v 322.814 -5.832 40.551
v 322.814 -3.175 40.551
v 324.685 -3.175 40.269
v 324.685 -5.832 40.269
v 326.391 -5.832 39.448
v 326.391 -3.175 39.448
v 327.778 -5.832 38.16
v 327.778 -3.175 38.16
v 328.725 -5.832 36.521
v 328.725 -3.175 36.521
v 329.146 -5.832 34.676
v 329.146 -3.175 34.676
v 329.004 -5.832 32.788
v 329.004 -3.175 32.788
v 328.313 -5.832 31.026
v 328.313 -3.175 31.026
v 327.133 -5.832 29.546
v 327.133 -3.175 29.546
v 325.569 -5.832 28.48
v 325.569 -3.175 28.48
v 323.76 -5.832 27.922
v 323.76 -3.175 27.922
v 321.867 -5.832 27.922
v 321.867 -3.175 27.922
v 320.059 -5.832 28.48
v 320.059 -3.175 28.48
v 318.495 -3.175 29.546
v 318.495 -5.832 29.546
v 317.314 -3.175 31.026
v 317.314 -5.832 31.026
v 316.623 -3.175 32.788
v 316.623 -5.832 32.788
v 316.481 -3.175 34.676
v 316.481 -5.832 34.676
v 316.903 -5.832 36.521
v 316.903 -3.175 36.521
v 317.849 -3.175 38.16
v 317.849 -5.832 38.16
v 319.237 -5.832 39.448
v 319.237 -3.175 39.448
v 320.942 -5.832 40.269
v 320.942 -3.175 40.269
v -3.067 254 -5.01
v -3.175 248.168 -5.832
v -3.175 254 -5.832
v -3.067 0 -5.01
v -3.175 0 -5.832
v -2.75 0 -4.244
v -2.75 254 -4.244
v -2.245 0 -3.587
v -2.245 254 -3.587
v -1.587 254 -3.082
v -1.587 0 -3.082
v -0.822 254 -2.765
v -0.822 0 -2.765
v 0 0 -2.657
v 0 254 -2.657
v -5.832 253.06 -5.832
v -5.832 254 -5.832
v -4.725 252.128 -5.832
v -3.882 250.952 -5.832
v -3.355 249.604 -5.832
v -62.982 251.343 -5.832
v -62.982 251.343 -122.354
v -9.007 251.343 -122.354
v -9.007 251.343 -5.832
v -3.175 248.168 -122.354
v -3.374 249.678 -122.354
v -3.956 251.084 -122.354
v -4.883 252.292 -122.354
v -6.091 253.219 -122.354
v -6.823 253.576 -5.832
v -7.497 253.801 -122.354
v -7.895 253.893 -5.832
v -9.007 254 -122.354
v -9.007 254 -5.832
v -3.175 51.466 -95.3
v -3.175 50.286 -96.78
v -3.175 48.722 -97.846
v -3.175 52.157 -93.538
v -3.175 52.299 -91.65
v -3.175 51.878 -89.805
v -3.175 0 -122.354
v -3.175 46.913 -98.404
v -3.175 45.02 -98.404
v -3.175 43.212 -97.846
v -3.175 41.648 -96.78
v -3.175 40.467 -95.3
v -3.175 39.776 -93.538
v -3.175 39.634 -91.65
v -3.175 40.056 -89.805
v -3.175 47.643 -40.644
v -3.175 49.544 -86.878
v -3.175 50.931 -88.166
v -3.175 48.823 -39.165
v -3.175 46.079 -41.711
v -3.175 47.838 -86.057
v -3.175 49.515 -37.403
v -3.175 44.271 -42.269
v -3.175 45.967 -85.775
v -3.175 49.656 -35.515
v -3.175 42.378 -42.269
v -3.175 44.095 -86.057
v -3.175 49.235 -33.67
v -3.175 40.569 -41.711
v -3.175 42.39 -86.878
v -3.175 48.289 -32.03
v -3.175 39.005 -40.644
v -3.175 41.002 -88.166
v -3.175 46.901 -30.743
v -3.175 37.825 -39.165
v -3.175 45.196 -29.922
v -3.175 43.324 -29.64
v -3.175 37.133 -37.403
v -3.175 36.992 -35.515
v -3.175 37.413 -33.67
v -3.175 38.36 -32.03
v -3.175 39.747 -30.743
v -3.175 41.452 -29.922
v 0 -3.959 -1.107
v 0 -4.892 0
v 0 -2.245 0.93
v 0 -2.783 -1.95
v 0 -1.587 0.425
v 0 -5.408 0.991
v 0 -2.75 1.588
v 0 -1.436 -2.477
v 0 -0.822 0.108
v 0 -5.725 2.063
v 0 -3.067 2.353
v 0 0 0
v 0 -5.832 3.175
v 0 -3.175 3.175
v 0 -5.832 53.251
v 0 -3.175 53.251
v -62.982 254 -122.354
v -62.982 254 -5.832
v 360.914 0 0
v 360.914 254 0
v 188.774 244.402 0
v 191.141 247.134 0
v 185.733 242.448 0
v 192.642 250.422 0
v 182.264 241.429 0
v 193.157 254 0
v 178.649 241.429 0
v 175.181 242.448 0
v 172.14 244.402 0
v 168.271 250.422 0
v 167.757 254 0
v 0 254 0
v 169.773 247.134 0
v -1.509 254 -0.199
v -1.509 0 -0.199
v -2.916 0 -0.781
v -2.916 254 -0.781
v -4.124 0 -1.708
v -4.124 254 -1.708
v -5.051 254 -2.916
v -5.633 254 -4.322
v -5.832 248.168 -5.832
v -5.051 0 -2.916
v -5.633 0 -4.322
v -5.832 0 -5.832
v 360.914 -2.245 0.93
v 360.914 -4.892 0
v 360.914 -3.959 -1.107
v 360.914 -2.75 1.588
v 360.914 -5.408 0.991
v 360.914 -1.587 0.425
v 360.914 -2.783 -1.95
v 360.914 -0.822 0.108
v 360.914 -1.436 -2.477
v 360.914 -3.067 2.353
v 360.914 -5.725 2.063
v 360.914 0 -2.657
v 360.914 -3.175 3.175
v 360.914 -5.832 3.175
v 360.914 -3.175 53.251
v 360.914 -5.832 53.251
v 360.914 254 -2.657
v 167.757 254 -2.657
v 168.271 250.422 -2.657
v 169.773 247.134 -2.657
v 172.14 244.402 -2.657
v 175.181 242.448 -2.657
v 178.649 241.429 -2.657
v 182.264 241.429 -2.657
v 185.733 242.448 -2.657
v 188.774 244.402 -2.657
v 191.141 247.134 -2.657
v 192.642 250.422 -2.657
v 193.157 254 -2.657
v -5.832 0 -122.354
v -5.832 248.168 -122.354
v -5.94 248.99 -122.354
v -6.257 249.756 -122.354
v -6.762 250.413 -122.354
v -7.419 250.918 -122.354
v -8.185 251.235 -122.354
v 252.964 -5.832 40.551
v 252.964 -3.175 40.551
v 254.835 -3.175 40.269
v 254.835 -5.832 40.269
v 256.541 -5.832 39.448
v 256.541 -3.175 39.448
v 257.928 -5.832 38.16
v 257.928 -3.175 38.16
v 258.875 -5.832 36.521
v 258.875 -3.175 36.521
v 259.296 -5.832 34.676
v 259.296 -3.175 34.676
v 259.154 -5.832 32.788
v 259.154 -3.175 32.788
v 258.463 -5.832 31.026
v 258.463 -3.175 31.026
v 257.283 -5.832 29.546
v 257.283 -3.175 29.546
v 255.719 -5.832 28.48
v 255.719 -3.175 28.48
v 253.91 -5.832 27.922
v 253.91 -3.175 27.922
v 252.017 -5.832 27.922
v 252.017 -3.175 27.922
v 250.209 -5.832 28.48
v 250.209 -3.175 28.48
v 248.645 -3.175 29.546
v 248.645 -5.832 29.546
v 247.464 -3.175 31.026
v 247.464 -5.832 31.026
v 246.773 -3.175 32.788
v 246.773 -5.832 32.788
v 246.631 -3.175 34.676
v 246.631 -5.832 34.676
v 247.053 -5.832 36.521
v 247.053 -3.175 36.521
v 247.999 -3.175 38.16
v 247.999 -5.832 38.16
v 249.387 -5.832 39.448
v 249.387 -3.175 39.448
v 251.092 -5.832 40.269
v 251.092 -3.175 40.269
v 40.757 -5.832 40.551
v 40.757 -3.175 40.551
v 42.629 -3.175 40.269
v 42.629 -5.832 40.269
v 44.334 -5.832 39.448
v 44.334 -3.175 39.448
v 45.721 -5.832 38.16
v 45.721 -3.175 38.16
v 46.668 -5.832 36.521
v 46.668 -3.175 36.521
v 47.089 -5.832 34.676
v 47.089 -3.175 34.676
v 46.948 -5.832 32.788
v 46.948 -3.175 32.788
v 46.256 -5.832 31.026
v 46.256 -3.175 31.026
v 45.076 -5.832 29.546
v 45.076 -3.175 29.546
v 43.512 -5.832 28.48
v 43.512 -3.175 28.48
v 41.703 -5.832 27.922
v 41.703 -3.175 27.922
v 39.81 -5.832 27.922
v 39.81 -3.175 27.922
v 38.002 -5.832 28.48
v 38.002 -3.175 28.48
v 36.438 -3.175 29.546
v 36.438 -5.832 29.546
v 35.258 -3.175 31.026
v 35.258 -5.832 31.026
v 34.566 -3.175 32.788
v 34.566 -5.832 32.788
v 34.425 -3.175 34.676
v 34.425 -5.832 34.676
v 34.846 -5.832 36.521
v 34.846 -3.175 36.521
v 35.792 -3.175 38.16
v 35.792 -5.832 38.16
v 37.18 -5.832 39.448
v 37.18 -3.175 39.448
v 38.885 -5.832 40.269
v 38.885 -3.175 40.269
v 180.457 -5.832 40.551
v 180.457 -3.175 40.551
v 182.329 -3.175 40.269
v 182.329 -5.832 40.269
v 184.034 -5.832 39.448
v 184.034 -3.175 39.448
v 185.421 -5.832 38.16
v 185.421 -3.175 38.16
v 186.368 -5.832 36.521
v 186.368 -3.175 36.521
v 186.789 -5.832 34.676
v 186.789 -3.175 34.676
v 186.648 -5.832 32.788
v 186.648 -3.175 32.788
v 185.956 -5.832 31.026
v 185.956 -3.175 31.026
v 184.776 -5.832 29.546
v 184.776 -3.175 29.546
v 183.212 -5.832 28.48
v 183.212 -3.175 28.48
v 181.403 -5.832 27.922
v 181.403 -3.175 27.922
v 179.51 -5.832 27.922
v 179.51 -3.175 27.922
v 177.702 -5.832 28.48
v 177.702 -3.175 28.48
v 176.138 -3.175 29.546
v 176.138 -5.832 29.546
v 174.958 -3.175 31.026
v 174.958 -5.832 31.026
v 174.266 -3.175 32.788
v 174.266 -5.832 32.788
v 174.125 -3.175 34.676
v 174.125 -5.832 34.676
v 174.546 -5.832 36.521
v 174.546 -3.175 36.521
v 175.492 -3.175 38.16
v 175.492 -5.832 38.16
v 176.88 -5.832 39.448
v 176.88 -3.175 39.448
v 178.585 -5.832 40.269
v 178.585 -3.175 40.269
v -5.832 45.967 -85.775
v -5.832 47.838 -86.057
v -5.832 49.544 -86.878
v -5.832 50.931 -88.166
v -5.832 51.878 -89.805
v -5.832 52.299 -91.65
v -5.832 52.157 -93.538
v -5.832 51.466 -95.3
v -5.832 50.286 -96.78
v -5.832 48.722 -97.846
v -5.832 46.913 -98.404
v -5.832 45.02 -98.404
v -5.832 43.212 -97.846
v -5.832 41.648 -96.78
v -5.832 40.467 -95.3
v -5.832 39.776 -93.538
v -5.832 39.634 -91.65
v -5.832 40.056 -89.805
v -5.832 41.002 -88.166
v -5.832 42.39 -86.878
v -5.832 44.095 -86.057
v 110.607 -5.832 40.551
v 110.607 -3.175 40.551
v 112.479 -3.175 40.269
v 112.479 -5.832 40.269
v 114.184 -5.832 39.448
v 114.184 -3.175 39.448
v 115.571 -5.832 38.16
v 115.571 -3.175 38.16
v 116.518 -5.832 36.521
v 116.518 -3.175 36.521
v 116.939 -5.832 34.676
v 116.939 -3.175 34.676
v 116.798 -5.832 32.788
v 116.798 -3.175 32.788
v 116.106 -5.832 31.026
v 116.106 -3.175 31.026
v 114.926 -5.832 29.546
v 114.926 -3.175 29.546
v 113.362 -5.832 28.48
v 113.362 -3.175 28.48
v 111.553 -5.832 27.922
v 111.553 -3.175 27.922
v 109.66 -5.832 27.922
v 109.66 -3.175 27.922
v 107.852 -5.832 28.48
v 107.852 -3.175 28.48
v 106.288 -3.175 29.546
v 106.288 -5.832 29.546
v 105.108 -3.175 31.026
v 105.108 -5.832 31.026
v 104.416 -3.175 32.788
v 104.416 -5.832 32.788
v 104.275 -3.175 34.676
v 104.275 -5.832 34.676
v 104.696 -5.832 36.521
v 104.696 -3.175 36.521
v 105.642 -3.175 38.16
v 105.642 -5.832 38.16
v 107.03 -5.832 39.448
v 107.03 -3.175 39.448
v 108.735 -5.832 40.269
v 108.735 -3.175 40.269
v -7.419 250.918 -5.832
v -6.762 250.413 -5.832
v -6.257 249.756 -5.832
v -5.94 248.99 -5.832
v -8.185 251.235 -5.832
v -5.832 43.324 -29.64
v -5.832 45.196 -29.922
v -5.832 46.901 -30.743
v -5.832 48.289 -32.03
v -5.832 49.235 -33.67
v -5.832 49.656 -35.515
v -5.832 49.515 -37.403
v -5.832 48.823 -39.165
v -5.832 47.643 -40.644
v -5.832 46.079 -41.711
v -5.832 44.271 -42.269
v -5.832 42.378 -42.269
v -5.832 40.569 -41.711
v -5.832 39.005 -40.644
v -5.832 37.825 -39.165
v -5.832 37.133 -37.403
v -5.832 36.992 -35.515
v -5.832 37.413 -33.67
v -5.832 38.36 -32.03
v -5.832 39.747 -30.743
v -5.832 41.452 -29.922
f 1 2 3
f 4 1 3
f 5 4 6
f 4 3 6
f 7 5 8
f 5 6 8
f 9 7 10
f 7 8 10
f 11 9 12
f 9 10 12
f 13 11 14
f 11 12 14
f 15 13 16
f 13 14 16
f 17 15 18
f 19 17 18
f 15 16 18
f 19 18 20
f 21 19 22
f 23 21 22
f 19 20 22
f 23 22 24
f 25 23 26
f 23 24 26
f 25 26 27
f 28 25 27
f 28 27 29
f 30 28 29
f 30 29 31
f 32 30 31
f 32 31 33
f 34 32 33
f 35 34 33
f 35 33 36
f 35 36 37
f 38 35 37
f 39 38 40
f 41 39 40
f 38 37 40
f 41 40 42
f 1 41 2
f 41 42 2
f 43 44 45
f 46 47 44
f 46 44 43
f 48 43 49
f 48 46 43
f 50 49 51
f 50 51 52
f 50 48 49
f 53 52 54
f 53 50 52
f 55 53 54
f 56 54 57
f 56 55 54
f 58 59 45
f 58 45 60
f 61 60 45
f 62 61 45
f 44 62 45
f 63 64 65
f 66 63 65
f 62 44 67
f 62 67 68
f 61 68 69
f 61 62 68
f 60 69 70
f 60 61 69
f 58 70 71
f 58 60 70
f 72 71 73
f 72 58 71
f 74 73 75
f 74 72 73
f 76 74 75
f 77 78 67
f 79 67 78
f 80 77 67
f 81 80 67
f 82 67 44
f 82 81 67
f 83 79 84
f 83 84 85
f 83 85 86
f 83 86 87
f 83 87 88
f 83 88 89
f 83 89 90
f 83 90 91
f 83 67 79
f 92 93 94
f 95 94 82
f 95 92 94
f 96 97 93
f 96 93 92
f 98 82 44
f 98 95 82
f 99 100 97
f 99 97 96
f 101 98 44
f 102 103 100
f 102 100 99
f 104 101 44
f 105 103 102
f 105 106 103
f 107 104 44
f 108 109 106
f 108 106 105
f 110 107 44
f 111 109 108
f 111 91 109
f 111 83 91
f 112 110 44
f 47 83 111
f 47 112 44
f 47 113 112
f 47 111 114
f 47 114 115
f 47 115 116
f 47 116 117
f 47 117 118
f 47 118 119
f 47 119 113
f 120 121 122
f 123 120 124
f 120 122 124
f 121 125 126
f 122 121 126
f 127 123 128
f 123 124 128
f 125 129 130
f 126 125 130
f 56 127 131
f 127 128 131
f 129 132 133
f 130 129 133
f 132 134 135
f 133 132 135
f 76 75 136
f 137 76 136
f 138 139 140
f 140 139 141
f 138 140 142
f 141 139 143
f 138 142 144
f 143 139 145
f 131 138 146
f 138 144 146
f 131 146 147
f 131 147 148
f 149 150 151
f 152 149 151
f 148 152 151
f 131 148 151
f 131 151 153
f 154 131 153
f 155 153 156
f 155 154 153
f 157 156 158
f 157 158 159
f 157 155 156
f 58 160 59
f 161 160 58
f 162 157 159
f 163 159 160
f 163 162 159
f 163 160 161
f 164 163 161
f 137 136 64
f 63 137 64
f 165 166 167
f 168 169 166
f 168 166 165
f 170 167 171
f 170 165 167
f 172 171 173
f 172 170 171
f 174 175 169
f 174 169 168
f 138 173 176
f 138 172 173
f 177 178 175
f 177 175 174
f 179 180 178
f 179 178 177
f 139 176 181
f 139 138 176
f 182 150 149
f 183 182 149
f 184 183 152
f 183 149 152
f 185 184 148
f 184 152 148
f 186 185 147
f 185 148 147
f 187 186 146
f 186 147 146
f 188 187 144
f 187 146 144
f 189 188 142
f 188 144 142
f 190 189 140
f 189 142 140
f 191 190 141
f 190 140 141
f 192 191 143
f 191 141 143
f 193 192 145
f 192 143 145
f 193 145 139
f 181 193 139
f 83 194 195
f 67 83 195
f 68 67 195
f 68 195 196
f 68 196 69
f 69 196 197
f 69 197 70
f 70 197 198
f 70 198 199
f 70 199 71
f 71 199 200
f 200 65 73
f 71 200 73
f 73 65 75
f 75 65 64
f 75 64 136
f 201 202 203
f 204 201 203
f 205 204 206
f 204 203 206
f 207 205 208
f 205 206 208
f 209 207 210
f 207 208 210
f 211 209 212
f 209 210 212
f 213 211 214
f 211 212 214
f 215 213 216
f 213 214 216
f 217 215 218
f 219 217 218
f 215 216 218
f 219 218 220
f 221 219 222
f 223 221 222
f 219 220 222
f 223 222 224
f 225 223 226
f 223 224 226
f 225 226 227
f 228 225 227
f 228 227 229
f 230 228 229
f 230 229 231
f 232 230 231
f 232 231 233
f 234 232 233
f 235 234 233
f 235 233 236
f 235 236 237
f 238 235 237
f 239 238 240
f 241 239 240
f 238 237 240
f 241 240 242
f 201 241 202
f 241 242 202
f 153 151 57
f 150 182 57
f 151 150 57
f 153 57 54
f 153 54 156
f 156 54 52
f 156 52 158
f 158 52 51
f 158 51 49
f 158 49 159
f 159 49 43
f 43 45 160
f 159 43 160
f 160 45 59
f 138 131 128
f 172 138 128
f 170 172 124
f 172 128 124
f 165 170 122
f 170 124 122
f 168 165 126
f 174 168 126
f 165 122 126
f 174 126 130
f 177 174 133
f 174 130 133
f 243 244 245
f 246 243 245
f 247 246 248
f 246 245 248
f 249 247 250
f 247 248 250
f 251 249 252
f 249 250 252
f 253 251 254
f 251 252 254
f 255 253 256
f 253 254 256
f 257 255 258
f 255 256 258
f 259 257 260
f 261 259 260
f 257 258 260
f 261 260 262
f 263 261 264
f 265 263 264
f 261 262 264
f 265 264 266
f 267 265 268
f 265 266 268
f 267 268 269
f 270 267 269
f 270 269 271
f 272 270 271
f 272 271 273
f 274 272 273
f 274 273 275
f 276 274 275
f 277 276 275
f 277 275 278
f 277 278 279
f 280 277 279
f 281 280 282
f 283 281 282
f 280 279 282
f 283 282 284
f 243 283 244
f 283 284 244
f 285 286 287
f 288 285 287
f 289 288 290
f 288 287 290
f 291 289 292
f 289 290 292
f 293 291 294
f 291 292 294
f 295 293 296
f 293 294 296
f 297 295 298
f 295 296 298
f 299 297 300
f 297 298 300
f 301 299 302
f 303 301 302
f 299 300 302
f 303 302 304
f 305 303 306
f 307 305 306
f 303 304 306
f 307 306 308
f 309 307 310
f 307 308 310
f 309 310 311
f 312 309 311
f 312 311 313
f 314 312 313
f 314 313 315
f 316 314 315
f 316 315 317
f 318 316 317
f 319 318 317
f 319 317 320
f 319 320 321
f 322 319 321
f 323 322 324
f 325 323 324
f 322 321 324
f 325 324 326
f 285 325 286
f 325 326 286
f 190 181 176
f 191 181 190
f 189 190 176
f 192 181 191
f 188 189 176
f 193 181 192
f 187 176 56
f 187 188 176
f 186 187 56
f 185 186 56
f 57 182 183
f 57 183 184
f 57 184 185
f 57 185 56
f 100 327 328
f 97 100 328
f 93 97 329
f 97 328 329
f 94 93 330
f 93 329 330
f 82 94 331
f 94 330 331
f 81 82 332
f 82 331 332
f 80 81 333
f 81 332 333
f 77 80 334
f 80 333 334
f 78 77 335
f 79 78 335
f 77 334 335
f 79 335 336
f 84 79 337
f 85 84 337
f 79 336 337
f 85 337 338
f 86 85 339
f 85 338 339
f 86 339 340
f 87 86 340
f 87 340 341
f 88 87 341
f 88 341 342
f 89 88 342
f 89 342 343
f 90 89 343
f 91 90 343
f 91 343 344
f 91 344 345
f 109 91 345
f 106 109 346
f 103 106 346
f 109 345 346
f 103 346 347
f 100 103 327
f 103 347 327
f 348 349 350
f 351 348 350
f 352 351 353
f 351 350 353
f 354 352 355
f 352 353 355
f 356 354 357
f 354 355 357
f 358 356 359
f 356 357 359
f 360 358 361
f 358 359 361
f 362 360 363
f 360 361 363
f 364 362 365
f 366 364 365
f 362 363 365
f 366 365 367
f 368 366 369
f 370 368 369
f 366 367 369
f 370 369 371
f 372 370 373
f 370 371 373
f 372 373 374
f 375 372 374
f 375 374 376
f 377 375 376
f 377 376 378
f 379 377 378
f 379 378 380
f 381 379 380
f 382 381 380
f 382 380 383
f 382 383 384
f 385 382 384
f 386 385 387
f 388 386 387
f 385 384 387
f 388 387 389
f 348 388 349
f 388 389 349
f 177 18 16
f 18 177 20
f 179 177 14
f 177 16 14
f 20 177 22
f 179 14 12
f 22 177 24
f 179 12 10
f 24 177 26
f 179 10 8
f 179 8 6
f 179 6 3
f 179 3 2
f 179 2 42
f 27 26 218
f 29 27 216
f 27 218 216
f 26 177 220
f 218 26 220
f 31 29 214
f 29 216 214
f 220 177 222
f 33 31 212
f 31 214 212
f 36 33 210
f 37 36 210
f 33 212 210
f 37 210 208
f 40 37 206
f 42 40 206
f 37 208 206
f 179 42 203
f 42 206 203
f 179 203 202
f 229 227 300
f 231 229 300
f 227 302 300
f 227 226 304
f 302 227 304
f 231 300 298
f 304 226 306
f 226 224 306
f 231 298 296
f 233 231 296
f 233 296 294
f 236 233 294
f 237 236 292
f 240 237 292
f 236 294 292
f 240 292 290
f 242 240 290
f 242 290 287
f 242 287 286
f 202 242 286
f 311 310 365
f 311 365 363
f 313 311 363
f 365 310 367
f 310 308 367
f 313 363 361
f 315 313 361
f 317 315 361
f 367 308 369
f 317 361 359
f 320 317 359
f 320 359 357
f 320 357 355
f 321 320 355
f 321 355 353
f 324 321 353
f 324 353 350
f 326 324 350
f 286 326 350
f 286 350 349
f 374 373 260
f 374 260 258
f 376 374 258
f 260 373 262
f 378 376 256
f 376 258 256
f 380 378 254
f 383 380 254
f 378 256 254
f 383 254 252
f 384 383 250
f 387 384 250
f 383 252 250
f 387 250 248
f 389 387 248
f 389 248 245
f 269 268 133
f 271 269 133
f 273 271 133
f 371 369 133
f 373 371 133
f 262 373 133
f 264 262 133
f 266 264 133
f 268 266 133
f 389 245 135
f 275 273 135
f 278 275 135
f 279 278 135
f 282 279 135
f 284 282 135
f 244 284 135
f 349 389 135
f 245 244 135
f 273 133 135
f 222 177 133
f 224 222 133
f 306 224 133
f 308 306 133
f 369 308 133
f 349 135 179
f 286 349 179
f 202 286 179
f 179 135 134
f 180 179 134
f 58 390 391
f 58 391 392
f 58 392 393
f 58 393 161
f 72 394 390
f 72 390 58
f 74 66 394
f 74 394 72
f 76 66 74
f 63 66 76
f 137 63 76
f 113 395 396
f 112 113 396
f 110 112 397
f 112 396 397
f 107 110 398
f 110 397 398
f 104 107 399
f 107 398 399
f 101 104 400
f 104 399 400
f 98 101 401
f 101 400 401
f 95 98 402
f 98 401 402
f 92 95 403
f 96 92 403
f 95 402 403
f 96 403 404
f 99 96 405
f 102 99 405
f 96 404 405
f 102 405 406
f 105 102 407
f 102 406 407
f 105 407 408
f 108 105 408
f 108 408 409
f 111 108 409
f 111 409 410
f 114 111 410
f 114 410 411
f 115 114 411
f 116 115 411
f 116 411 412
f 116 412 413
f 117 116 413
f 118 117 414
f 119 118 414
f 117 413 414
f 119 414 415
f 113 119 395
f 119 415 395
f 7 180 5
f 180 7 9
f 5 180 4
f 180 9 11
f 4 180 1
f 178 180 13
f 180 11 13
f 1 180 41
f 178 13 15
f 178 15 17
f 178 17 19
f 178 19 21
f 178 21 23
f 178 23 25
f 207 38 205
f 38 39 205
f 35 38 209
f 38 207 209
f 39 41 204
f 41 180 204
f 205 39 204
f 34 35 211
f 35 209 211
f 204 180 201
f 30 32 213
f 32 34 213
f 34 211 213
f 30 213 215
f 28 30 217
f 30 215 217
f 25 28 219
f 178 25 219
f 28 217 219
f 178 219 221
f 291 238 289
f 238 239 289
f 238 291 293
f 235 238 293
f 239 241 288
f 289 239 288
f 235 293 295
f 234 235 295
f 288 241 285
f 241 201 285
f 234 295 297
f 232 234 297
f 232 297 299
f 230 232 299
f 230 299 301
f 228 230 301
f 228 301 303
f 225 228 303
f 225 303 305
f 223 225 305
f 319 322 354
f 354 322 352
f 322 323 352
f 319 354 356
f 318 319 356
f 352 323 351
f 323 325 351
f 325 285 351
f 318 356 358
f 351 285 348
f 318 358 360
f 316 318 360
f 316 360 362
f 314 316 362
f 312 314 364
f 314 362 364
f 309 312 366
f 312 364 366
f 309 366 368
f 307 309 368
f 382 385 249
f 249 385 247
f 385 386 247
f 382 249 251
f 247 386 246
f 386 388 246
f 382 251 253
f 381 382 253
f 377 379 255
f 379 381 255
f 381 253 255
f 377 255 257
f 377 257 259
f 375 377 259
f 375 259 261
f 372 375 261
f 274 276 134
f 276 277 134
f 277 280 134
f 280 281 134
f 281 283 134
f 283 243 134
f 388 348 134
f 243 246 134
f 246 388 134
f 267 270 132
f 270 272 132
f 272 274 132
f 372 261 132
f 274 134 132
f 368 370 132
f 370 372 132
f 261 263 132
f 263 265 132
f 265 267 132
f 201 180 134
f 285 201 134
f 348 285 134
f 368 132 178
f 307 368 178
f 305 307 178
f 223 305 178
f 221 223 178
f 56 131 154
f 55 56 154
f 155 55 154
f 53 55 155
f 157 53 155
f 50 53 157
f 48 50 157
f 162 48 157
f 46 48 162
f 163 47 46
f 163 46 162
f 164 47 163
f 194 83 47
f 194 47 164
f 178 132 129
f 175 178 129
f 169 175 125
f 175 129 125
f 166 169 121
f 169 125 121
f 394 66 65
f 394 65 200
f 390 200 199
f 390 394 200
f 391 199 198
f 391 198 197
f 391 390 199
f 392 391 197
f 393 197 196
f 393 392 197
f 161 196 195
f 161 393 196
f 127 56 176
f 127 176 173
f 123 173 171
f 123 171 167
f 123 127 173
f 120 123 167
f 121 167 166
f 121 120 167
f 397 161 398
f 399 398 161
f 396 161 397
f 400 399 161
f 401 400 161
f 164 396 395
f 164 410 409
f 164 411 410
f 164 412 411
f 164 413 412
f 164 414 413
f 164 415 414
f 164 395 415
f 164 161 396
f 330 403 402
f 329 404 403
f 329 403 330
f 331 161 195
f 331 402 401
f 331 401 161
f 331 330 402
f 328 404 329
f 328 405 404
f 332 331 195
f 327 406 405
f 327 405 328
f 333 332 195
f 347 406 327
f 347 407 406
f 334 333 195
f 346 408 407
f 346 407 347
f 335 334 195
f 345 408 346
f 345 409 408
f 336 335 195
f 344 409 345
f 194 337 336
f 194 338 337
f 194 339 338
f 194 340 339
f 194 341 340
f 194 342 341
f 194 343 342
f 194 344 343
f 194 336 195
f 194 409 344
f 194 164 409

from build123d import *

# Parameters (mm, degrees)
BASE_FLANGE1_DEPTH           = 2.65684
SKETCHED_BEND3_DEPTH         = 360.91368
SKETCHED_BEND3_2_DEPTH       = 360.91368
SKETCH10_R                   = 6.35
CUT_EXTRUDE2_DEPTH           = 2.65684
EDGE_FLANGE5_DEPTH           = 254
EDGE_FLANGE6_STRIP_W         = 16.97736
EDGE_FLANGE6_STRIP_H         = 2.65684
EDGE_FLANGE6_STRIP_CUT_DEPTH = 116.5225
EDGE_FLANGE6_DEPTH           = 116.5225
SKETCH36_R                   = 6.35
CUT_EXTRUDE4_DEPTH           = 2.65684


# Read off the part's stored shape, not the designer's step: Sketched Bend3
# Sheet-metal steps are written as plain solids
with BuildPart() as part:
    # Sketch1 → Base-Flange1 (new body)
    with BuildSketch(Plane.XY):
        with BuildLine():
            Line((0, 0), (0, 254))
            Line((0, 254), (167.75684, 254))
            ThreePointArc((167.75684, 254), (180.45684, 241.3), (193.15684, 254))
            Line((193.15684, 254), (360.91368, 254))
            Line((360.91368, 254), (360.91368, 0))
            Line((360.91368, 0), (360.91368, -57.15))
            Line((360.91368, -57.15), (0, -57.15))
            Line((0, -57.15), (0, 0))
        make_face()
    extrude(amount=-BASE_FLANGE1_DEPTH)

    # Sketched Bend3 outline → Sketched Bend3 (cut)
    with BuildSketch(Plane.YZ):
        with BuildLine():
            ThreePointArc((0, -2.65684), (-2.783367186, -1.949765838), (-4.891802611, 0))
            Line((-4.891802611, 0), (-57.15, 0))
            Line((-57.15, 0), (-57.15, -2.65684))
            Line((-57.15, -2.65684), (0, -2.65684))
        make_face()
    extrude(amount=SKETCHED_BEND3_DEPTH, mode=Mode.SUBTRACT)

    # Sketched Bend3 2 outline → Sketched Bend3 2 (add)
    with BuildSketch(Plane.YZ):
        with BuildLine():
            ThreePointArc((0, 0), (-2.24506403, 0.92993597), (-3.175, 3.175))
            Line((-3.175, 3.175), (-3.175, 53.251044406))
            Line((-3.175, 53.251044406), (-5.83184, 53.251044406))
            Line((-5.83184, 53.251044406), (-5.83184, 3.175))
            ThreePointArc((-5.83184, 3.175), (-5.591894488, 1.519381136), (-4.891802611, 0))
            Line((-4.891802611, 0), (0, 0))
        make_face()
    extrude(amount=SKETCHED_BEND3_2_DEPTH)

    # Sketch10 → Cut-Extrude2 (cut)
    with BuildSketch(Plane(origin=(0, -3.175, 0), x_dir=(1, 0, 0), z_dir=(0, 1, 0))):
        with Locations(Location((322.81368, -34.201044406, 0), (0, 0, 270))):
            Circle(SKETCH10_R)
        with Locations(Location((252.96368, -34.201044406, 0), (0, 0, 270))):
            Circle(SKETCH10_R)
        with Locations(Location((40.75684, -34.201044406, 0), (0, 0, 270))):
            Circle(SKETCH10_R)
        with Locations(Location((110.60684, -34.201044406, 0), (0, 0, 270))):
            Circle(SKETCH10_R)
        with Locations(Location((180.45684, -34.201044406, 0), (0, 0, 270))):
            Circle(SKETCH10_R)
    extrude(amount=-CUT_EXTRUDE2_DEPTH, mode=Mode.SUBTRACT)

    # Edge-Flange5 section (across the edge) → Edge-Flange5 (add)
    with BuildSketch(Plane(origin=(-3.175, 0, -2.65684), x_dir=(1, 0, 0), z_dir=(0, 1, 0))):
        with BuildLine():
            Line((-2.65684, 3.175), (-2.65684, 119.6975))
            Line((-2.65684, 119.6975), (0, 119.6975))
            Line((0, 119.6975), (0, 3.175))
            ThreePointArc((0, 3.175), (0.92993597, 0.92993597), (3.175, 0))
            Line((3.175, 0), (3.175, -2.65684))
            ThreePointArc((3.175, -2.65684), (-0.948733611, -0.948733611), (-2.65684, 3.175))
        make_face()
    extrude(amount=EDGE_FLANGE5_DEPTH)

    # Edge-Flange6 strip (across the edge) → Edge-Flange6 strip cut (cut)
    with BuildSketch(Plane(origin=(-5.83184, 254, -5.83184), x_dir=(0, -1, 0), z_dir=(0, 0, -1))):
        with Locations((-2.65684, -1.32842)):
            Rectangle(EDGE_FLANGE6_STRIP_W, EDGE_FLANGE6_STRIP_H)
    extrude(amount=EDGE_FLANGE6_STRIP_CUT_DEPTH, mode=Mode.SUBTRACT)

    # Edge-Flange6 section (across the edge) → Edge-Flange6 (add)
    with BuildSketch(Plane(origin=(-5.83184, 254, -5.83184), x_dir=(0, -1, 0), z_dir=(0, 0, -1))):
        with BuildLine():
            Line((0, 3.175), (0, 57.15))
            Line((0, 57.15), (2.65684, 57.15))
            Line((2.65684, 57.15), (2.65684, 3.175))
            ThreePointArc((2.65684, 3.175), (3.58677597, 0.92993597), (5.83184, 0))
            Line((5.83184, 0), (5.83184, -2.65684))
            ThreePointArc((5.83184, -2.65684), (1.708106389, -0.948733611), (0, 3.175))
        make_face()
    extrude(amount=EDGE_FLANGE6_DEPTH)

    # Sketch36 → Cut-Extrude4 (cut)
    with BuildSketch(Plane.ZY.offset(5.83184)):
        with Locations((-35.989590501, 43.324159587)):
            Circle(SKETCH36_R)
        with Locations((-92.124928486, 45.966665125)):
            Circle(SKETCH36_R)
    extrude(amount=-CUT_EXTRUDE4_DEPTH, mode=Mode.SUBTRACT)


solid = part.part
